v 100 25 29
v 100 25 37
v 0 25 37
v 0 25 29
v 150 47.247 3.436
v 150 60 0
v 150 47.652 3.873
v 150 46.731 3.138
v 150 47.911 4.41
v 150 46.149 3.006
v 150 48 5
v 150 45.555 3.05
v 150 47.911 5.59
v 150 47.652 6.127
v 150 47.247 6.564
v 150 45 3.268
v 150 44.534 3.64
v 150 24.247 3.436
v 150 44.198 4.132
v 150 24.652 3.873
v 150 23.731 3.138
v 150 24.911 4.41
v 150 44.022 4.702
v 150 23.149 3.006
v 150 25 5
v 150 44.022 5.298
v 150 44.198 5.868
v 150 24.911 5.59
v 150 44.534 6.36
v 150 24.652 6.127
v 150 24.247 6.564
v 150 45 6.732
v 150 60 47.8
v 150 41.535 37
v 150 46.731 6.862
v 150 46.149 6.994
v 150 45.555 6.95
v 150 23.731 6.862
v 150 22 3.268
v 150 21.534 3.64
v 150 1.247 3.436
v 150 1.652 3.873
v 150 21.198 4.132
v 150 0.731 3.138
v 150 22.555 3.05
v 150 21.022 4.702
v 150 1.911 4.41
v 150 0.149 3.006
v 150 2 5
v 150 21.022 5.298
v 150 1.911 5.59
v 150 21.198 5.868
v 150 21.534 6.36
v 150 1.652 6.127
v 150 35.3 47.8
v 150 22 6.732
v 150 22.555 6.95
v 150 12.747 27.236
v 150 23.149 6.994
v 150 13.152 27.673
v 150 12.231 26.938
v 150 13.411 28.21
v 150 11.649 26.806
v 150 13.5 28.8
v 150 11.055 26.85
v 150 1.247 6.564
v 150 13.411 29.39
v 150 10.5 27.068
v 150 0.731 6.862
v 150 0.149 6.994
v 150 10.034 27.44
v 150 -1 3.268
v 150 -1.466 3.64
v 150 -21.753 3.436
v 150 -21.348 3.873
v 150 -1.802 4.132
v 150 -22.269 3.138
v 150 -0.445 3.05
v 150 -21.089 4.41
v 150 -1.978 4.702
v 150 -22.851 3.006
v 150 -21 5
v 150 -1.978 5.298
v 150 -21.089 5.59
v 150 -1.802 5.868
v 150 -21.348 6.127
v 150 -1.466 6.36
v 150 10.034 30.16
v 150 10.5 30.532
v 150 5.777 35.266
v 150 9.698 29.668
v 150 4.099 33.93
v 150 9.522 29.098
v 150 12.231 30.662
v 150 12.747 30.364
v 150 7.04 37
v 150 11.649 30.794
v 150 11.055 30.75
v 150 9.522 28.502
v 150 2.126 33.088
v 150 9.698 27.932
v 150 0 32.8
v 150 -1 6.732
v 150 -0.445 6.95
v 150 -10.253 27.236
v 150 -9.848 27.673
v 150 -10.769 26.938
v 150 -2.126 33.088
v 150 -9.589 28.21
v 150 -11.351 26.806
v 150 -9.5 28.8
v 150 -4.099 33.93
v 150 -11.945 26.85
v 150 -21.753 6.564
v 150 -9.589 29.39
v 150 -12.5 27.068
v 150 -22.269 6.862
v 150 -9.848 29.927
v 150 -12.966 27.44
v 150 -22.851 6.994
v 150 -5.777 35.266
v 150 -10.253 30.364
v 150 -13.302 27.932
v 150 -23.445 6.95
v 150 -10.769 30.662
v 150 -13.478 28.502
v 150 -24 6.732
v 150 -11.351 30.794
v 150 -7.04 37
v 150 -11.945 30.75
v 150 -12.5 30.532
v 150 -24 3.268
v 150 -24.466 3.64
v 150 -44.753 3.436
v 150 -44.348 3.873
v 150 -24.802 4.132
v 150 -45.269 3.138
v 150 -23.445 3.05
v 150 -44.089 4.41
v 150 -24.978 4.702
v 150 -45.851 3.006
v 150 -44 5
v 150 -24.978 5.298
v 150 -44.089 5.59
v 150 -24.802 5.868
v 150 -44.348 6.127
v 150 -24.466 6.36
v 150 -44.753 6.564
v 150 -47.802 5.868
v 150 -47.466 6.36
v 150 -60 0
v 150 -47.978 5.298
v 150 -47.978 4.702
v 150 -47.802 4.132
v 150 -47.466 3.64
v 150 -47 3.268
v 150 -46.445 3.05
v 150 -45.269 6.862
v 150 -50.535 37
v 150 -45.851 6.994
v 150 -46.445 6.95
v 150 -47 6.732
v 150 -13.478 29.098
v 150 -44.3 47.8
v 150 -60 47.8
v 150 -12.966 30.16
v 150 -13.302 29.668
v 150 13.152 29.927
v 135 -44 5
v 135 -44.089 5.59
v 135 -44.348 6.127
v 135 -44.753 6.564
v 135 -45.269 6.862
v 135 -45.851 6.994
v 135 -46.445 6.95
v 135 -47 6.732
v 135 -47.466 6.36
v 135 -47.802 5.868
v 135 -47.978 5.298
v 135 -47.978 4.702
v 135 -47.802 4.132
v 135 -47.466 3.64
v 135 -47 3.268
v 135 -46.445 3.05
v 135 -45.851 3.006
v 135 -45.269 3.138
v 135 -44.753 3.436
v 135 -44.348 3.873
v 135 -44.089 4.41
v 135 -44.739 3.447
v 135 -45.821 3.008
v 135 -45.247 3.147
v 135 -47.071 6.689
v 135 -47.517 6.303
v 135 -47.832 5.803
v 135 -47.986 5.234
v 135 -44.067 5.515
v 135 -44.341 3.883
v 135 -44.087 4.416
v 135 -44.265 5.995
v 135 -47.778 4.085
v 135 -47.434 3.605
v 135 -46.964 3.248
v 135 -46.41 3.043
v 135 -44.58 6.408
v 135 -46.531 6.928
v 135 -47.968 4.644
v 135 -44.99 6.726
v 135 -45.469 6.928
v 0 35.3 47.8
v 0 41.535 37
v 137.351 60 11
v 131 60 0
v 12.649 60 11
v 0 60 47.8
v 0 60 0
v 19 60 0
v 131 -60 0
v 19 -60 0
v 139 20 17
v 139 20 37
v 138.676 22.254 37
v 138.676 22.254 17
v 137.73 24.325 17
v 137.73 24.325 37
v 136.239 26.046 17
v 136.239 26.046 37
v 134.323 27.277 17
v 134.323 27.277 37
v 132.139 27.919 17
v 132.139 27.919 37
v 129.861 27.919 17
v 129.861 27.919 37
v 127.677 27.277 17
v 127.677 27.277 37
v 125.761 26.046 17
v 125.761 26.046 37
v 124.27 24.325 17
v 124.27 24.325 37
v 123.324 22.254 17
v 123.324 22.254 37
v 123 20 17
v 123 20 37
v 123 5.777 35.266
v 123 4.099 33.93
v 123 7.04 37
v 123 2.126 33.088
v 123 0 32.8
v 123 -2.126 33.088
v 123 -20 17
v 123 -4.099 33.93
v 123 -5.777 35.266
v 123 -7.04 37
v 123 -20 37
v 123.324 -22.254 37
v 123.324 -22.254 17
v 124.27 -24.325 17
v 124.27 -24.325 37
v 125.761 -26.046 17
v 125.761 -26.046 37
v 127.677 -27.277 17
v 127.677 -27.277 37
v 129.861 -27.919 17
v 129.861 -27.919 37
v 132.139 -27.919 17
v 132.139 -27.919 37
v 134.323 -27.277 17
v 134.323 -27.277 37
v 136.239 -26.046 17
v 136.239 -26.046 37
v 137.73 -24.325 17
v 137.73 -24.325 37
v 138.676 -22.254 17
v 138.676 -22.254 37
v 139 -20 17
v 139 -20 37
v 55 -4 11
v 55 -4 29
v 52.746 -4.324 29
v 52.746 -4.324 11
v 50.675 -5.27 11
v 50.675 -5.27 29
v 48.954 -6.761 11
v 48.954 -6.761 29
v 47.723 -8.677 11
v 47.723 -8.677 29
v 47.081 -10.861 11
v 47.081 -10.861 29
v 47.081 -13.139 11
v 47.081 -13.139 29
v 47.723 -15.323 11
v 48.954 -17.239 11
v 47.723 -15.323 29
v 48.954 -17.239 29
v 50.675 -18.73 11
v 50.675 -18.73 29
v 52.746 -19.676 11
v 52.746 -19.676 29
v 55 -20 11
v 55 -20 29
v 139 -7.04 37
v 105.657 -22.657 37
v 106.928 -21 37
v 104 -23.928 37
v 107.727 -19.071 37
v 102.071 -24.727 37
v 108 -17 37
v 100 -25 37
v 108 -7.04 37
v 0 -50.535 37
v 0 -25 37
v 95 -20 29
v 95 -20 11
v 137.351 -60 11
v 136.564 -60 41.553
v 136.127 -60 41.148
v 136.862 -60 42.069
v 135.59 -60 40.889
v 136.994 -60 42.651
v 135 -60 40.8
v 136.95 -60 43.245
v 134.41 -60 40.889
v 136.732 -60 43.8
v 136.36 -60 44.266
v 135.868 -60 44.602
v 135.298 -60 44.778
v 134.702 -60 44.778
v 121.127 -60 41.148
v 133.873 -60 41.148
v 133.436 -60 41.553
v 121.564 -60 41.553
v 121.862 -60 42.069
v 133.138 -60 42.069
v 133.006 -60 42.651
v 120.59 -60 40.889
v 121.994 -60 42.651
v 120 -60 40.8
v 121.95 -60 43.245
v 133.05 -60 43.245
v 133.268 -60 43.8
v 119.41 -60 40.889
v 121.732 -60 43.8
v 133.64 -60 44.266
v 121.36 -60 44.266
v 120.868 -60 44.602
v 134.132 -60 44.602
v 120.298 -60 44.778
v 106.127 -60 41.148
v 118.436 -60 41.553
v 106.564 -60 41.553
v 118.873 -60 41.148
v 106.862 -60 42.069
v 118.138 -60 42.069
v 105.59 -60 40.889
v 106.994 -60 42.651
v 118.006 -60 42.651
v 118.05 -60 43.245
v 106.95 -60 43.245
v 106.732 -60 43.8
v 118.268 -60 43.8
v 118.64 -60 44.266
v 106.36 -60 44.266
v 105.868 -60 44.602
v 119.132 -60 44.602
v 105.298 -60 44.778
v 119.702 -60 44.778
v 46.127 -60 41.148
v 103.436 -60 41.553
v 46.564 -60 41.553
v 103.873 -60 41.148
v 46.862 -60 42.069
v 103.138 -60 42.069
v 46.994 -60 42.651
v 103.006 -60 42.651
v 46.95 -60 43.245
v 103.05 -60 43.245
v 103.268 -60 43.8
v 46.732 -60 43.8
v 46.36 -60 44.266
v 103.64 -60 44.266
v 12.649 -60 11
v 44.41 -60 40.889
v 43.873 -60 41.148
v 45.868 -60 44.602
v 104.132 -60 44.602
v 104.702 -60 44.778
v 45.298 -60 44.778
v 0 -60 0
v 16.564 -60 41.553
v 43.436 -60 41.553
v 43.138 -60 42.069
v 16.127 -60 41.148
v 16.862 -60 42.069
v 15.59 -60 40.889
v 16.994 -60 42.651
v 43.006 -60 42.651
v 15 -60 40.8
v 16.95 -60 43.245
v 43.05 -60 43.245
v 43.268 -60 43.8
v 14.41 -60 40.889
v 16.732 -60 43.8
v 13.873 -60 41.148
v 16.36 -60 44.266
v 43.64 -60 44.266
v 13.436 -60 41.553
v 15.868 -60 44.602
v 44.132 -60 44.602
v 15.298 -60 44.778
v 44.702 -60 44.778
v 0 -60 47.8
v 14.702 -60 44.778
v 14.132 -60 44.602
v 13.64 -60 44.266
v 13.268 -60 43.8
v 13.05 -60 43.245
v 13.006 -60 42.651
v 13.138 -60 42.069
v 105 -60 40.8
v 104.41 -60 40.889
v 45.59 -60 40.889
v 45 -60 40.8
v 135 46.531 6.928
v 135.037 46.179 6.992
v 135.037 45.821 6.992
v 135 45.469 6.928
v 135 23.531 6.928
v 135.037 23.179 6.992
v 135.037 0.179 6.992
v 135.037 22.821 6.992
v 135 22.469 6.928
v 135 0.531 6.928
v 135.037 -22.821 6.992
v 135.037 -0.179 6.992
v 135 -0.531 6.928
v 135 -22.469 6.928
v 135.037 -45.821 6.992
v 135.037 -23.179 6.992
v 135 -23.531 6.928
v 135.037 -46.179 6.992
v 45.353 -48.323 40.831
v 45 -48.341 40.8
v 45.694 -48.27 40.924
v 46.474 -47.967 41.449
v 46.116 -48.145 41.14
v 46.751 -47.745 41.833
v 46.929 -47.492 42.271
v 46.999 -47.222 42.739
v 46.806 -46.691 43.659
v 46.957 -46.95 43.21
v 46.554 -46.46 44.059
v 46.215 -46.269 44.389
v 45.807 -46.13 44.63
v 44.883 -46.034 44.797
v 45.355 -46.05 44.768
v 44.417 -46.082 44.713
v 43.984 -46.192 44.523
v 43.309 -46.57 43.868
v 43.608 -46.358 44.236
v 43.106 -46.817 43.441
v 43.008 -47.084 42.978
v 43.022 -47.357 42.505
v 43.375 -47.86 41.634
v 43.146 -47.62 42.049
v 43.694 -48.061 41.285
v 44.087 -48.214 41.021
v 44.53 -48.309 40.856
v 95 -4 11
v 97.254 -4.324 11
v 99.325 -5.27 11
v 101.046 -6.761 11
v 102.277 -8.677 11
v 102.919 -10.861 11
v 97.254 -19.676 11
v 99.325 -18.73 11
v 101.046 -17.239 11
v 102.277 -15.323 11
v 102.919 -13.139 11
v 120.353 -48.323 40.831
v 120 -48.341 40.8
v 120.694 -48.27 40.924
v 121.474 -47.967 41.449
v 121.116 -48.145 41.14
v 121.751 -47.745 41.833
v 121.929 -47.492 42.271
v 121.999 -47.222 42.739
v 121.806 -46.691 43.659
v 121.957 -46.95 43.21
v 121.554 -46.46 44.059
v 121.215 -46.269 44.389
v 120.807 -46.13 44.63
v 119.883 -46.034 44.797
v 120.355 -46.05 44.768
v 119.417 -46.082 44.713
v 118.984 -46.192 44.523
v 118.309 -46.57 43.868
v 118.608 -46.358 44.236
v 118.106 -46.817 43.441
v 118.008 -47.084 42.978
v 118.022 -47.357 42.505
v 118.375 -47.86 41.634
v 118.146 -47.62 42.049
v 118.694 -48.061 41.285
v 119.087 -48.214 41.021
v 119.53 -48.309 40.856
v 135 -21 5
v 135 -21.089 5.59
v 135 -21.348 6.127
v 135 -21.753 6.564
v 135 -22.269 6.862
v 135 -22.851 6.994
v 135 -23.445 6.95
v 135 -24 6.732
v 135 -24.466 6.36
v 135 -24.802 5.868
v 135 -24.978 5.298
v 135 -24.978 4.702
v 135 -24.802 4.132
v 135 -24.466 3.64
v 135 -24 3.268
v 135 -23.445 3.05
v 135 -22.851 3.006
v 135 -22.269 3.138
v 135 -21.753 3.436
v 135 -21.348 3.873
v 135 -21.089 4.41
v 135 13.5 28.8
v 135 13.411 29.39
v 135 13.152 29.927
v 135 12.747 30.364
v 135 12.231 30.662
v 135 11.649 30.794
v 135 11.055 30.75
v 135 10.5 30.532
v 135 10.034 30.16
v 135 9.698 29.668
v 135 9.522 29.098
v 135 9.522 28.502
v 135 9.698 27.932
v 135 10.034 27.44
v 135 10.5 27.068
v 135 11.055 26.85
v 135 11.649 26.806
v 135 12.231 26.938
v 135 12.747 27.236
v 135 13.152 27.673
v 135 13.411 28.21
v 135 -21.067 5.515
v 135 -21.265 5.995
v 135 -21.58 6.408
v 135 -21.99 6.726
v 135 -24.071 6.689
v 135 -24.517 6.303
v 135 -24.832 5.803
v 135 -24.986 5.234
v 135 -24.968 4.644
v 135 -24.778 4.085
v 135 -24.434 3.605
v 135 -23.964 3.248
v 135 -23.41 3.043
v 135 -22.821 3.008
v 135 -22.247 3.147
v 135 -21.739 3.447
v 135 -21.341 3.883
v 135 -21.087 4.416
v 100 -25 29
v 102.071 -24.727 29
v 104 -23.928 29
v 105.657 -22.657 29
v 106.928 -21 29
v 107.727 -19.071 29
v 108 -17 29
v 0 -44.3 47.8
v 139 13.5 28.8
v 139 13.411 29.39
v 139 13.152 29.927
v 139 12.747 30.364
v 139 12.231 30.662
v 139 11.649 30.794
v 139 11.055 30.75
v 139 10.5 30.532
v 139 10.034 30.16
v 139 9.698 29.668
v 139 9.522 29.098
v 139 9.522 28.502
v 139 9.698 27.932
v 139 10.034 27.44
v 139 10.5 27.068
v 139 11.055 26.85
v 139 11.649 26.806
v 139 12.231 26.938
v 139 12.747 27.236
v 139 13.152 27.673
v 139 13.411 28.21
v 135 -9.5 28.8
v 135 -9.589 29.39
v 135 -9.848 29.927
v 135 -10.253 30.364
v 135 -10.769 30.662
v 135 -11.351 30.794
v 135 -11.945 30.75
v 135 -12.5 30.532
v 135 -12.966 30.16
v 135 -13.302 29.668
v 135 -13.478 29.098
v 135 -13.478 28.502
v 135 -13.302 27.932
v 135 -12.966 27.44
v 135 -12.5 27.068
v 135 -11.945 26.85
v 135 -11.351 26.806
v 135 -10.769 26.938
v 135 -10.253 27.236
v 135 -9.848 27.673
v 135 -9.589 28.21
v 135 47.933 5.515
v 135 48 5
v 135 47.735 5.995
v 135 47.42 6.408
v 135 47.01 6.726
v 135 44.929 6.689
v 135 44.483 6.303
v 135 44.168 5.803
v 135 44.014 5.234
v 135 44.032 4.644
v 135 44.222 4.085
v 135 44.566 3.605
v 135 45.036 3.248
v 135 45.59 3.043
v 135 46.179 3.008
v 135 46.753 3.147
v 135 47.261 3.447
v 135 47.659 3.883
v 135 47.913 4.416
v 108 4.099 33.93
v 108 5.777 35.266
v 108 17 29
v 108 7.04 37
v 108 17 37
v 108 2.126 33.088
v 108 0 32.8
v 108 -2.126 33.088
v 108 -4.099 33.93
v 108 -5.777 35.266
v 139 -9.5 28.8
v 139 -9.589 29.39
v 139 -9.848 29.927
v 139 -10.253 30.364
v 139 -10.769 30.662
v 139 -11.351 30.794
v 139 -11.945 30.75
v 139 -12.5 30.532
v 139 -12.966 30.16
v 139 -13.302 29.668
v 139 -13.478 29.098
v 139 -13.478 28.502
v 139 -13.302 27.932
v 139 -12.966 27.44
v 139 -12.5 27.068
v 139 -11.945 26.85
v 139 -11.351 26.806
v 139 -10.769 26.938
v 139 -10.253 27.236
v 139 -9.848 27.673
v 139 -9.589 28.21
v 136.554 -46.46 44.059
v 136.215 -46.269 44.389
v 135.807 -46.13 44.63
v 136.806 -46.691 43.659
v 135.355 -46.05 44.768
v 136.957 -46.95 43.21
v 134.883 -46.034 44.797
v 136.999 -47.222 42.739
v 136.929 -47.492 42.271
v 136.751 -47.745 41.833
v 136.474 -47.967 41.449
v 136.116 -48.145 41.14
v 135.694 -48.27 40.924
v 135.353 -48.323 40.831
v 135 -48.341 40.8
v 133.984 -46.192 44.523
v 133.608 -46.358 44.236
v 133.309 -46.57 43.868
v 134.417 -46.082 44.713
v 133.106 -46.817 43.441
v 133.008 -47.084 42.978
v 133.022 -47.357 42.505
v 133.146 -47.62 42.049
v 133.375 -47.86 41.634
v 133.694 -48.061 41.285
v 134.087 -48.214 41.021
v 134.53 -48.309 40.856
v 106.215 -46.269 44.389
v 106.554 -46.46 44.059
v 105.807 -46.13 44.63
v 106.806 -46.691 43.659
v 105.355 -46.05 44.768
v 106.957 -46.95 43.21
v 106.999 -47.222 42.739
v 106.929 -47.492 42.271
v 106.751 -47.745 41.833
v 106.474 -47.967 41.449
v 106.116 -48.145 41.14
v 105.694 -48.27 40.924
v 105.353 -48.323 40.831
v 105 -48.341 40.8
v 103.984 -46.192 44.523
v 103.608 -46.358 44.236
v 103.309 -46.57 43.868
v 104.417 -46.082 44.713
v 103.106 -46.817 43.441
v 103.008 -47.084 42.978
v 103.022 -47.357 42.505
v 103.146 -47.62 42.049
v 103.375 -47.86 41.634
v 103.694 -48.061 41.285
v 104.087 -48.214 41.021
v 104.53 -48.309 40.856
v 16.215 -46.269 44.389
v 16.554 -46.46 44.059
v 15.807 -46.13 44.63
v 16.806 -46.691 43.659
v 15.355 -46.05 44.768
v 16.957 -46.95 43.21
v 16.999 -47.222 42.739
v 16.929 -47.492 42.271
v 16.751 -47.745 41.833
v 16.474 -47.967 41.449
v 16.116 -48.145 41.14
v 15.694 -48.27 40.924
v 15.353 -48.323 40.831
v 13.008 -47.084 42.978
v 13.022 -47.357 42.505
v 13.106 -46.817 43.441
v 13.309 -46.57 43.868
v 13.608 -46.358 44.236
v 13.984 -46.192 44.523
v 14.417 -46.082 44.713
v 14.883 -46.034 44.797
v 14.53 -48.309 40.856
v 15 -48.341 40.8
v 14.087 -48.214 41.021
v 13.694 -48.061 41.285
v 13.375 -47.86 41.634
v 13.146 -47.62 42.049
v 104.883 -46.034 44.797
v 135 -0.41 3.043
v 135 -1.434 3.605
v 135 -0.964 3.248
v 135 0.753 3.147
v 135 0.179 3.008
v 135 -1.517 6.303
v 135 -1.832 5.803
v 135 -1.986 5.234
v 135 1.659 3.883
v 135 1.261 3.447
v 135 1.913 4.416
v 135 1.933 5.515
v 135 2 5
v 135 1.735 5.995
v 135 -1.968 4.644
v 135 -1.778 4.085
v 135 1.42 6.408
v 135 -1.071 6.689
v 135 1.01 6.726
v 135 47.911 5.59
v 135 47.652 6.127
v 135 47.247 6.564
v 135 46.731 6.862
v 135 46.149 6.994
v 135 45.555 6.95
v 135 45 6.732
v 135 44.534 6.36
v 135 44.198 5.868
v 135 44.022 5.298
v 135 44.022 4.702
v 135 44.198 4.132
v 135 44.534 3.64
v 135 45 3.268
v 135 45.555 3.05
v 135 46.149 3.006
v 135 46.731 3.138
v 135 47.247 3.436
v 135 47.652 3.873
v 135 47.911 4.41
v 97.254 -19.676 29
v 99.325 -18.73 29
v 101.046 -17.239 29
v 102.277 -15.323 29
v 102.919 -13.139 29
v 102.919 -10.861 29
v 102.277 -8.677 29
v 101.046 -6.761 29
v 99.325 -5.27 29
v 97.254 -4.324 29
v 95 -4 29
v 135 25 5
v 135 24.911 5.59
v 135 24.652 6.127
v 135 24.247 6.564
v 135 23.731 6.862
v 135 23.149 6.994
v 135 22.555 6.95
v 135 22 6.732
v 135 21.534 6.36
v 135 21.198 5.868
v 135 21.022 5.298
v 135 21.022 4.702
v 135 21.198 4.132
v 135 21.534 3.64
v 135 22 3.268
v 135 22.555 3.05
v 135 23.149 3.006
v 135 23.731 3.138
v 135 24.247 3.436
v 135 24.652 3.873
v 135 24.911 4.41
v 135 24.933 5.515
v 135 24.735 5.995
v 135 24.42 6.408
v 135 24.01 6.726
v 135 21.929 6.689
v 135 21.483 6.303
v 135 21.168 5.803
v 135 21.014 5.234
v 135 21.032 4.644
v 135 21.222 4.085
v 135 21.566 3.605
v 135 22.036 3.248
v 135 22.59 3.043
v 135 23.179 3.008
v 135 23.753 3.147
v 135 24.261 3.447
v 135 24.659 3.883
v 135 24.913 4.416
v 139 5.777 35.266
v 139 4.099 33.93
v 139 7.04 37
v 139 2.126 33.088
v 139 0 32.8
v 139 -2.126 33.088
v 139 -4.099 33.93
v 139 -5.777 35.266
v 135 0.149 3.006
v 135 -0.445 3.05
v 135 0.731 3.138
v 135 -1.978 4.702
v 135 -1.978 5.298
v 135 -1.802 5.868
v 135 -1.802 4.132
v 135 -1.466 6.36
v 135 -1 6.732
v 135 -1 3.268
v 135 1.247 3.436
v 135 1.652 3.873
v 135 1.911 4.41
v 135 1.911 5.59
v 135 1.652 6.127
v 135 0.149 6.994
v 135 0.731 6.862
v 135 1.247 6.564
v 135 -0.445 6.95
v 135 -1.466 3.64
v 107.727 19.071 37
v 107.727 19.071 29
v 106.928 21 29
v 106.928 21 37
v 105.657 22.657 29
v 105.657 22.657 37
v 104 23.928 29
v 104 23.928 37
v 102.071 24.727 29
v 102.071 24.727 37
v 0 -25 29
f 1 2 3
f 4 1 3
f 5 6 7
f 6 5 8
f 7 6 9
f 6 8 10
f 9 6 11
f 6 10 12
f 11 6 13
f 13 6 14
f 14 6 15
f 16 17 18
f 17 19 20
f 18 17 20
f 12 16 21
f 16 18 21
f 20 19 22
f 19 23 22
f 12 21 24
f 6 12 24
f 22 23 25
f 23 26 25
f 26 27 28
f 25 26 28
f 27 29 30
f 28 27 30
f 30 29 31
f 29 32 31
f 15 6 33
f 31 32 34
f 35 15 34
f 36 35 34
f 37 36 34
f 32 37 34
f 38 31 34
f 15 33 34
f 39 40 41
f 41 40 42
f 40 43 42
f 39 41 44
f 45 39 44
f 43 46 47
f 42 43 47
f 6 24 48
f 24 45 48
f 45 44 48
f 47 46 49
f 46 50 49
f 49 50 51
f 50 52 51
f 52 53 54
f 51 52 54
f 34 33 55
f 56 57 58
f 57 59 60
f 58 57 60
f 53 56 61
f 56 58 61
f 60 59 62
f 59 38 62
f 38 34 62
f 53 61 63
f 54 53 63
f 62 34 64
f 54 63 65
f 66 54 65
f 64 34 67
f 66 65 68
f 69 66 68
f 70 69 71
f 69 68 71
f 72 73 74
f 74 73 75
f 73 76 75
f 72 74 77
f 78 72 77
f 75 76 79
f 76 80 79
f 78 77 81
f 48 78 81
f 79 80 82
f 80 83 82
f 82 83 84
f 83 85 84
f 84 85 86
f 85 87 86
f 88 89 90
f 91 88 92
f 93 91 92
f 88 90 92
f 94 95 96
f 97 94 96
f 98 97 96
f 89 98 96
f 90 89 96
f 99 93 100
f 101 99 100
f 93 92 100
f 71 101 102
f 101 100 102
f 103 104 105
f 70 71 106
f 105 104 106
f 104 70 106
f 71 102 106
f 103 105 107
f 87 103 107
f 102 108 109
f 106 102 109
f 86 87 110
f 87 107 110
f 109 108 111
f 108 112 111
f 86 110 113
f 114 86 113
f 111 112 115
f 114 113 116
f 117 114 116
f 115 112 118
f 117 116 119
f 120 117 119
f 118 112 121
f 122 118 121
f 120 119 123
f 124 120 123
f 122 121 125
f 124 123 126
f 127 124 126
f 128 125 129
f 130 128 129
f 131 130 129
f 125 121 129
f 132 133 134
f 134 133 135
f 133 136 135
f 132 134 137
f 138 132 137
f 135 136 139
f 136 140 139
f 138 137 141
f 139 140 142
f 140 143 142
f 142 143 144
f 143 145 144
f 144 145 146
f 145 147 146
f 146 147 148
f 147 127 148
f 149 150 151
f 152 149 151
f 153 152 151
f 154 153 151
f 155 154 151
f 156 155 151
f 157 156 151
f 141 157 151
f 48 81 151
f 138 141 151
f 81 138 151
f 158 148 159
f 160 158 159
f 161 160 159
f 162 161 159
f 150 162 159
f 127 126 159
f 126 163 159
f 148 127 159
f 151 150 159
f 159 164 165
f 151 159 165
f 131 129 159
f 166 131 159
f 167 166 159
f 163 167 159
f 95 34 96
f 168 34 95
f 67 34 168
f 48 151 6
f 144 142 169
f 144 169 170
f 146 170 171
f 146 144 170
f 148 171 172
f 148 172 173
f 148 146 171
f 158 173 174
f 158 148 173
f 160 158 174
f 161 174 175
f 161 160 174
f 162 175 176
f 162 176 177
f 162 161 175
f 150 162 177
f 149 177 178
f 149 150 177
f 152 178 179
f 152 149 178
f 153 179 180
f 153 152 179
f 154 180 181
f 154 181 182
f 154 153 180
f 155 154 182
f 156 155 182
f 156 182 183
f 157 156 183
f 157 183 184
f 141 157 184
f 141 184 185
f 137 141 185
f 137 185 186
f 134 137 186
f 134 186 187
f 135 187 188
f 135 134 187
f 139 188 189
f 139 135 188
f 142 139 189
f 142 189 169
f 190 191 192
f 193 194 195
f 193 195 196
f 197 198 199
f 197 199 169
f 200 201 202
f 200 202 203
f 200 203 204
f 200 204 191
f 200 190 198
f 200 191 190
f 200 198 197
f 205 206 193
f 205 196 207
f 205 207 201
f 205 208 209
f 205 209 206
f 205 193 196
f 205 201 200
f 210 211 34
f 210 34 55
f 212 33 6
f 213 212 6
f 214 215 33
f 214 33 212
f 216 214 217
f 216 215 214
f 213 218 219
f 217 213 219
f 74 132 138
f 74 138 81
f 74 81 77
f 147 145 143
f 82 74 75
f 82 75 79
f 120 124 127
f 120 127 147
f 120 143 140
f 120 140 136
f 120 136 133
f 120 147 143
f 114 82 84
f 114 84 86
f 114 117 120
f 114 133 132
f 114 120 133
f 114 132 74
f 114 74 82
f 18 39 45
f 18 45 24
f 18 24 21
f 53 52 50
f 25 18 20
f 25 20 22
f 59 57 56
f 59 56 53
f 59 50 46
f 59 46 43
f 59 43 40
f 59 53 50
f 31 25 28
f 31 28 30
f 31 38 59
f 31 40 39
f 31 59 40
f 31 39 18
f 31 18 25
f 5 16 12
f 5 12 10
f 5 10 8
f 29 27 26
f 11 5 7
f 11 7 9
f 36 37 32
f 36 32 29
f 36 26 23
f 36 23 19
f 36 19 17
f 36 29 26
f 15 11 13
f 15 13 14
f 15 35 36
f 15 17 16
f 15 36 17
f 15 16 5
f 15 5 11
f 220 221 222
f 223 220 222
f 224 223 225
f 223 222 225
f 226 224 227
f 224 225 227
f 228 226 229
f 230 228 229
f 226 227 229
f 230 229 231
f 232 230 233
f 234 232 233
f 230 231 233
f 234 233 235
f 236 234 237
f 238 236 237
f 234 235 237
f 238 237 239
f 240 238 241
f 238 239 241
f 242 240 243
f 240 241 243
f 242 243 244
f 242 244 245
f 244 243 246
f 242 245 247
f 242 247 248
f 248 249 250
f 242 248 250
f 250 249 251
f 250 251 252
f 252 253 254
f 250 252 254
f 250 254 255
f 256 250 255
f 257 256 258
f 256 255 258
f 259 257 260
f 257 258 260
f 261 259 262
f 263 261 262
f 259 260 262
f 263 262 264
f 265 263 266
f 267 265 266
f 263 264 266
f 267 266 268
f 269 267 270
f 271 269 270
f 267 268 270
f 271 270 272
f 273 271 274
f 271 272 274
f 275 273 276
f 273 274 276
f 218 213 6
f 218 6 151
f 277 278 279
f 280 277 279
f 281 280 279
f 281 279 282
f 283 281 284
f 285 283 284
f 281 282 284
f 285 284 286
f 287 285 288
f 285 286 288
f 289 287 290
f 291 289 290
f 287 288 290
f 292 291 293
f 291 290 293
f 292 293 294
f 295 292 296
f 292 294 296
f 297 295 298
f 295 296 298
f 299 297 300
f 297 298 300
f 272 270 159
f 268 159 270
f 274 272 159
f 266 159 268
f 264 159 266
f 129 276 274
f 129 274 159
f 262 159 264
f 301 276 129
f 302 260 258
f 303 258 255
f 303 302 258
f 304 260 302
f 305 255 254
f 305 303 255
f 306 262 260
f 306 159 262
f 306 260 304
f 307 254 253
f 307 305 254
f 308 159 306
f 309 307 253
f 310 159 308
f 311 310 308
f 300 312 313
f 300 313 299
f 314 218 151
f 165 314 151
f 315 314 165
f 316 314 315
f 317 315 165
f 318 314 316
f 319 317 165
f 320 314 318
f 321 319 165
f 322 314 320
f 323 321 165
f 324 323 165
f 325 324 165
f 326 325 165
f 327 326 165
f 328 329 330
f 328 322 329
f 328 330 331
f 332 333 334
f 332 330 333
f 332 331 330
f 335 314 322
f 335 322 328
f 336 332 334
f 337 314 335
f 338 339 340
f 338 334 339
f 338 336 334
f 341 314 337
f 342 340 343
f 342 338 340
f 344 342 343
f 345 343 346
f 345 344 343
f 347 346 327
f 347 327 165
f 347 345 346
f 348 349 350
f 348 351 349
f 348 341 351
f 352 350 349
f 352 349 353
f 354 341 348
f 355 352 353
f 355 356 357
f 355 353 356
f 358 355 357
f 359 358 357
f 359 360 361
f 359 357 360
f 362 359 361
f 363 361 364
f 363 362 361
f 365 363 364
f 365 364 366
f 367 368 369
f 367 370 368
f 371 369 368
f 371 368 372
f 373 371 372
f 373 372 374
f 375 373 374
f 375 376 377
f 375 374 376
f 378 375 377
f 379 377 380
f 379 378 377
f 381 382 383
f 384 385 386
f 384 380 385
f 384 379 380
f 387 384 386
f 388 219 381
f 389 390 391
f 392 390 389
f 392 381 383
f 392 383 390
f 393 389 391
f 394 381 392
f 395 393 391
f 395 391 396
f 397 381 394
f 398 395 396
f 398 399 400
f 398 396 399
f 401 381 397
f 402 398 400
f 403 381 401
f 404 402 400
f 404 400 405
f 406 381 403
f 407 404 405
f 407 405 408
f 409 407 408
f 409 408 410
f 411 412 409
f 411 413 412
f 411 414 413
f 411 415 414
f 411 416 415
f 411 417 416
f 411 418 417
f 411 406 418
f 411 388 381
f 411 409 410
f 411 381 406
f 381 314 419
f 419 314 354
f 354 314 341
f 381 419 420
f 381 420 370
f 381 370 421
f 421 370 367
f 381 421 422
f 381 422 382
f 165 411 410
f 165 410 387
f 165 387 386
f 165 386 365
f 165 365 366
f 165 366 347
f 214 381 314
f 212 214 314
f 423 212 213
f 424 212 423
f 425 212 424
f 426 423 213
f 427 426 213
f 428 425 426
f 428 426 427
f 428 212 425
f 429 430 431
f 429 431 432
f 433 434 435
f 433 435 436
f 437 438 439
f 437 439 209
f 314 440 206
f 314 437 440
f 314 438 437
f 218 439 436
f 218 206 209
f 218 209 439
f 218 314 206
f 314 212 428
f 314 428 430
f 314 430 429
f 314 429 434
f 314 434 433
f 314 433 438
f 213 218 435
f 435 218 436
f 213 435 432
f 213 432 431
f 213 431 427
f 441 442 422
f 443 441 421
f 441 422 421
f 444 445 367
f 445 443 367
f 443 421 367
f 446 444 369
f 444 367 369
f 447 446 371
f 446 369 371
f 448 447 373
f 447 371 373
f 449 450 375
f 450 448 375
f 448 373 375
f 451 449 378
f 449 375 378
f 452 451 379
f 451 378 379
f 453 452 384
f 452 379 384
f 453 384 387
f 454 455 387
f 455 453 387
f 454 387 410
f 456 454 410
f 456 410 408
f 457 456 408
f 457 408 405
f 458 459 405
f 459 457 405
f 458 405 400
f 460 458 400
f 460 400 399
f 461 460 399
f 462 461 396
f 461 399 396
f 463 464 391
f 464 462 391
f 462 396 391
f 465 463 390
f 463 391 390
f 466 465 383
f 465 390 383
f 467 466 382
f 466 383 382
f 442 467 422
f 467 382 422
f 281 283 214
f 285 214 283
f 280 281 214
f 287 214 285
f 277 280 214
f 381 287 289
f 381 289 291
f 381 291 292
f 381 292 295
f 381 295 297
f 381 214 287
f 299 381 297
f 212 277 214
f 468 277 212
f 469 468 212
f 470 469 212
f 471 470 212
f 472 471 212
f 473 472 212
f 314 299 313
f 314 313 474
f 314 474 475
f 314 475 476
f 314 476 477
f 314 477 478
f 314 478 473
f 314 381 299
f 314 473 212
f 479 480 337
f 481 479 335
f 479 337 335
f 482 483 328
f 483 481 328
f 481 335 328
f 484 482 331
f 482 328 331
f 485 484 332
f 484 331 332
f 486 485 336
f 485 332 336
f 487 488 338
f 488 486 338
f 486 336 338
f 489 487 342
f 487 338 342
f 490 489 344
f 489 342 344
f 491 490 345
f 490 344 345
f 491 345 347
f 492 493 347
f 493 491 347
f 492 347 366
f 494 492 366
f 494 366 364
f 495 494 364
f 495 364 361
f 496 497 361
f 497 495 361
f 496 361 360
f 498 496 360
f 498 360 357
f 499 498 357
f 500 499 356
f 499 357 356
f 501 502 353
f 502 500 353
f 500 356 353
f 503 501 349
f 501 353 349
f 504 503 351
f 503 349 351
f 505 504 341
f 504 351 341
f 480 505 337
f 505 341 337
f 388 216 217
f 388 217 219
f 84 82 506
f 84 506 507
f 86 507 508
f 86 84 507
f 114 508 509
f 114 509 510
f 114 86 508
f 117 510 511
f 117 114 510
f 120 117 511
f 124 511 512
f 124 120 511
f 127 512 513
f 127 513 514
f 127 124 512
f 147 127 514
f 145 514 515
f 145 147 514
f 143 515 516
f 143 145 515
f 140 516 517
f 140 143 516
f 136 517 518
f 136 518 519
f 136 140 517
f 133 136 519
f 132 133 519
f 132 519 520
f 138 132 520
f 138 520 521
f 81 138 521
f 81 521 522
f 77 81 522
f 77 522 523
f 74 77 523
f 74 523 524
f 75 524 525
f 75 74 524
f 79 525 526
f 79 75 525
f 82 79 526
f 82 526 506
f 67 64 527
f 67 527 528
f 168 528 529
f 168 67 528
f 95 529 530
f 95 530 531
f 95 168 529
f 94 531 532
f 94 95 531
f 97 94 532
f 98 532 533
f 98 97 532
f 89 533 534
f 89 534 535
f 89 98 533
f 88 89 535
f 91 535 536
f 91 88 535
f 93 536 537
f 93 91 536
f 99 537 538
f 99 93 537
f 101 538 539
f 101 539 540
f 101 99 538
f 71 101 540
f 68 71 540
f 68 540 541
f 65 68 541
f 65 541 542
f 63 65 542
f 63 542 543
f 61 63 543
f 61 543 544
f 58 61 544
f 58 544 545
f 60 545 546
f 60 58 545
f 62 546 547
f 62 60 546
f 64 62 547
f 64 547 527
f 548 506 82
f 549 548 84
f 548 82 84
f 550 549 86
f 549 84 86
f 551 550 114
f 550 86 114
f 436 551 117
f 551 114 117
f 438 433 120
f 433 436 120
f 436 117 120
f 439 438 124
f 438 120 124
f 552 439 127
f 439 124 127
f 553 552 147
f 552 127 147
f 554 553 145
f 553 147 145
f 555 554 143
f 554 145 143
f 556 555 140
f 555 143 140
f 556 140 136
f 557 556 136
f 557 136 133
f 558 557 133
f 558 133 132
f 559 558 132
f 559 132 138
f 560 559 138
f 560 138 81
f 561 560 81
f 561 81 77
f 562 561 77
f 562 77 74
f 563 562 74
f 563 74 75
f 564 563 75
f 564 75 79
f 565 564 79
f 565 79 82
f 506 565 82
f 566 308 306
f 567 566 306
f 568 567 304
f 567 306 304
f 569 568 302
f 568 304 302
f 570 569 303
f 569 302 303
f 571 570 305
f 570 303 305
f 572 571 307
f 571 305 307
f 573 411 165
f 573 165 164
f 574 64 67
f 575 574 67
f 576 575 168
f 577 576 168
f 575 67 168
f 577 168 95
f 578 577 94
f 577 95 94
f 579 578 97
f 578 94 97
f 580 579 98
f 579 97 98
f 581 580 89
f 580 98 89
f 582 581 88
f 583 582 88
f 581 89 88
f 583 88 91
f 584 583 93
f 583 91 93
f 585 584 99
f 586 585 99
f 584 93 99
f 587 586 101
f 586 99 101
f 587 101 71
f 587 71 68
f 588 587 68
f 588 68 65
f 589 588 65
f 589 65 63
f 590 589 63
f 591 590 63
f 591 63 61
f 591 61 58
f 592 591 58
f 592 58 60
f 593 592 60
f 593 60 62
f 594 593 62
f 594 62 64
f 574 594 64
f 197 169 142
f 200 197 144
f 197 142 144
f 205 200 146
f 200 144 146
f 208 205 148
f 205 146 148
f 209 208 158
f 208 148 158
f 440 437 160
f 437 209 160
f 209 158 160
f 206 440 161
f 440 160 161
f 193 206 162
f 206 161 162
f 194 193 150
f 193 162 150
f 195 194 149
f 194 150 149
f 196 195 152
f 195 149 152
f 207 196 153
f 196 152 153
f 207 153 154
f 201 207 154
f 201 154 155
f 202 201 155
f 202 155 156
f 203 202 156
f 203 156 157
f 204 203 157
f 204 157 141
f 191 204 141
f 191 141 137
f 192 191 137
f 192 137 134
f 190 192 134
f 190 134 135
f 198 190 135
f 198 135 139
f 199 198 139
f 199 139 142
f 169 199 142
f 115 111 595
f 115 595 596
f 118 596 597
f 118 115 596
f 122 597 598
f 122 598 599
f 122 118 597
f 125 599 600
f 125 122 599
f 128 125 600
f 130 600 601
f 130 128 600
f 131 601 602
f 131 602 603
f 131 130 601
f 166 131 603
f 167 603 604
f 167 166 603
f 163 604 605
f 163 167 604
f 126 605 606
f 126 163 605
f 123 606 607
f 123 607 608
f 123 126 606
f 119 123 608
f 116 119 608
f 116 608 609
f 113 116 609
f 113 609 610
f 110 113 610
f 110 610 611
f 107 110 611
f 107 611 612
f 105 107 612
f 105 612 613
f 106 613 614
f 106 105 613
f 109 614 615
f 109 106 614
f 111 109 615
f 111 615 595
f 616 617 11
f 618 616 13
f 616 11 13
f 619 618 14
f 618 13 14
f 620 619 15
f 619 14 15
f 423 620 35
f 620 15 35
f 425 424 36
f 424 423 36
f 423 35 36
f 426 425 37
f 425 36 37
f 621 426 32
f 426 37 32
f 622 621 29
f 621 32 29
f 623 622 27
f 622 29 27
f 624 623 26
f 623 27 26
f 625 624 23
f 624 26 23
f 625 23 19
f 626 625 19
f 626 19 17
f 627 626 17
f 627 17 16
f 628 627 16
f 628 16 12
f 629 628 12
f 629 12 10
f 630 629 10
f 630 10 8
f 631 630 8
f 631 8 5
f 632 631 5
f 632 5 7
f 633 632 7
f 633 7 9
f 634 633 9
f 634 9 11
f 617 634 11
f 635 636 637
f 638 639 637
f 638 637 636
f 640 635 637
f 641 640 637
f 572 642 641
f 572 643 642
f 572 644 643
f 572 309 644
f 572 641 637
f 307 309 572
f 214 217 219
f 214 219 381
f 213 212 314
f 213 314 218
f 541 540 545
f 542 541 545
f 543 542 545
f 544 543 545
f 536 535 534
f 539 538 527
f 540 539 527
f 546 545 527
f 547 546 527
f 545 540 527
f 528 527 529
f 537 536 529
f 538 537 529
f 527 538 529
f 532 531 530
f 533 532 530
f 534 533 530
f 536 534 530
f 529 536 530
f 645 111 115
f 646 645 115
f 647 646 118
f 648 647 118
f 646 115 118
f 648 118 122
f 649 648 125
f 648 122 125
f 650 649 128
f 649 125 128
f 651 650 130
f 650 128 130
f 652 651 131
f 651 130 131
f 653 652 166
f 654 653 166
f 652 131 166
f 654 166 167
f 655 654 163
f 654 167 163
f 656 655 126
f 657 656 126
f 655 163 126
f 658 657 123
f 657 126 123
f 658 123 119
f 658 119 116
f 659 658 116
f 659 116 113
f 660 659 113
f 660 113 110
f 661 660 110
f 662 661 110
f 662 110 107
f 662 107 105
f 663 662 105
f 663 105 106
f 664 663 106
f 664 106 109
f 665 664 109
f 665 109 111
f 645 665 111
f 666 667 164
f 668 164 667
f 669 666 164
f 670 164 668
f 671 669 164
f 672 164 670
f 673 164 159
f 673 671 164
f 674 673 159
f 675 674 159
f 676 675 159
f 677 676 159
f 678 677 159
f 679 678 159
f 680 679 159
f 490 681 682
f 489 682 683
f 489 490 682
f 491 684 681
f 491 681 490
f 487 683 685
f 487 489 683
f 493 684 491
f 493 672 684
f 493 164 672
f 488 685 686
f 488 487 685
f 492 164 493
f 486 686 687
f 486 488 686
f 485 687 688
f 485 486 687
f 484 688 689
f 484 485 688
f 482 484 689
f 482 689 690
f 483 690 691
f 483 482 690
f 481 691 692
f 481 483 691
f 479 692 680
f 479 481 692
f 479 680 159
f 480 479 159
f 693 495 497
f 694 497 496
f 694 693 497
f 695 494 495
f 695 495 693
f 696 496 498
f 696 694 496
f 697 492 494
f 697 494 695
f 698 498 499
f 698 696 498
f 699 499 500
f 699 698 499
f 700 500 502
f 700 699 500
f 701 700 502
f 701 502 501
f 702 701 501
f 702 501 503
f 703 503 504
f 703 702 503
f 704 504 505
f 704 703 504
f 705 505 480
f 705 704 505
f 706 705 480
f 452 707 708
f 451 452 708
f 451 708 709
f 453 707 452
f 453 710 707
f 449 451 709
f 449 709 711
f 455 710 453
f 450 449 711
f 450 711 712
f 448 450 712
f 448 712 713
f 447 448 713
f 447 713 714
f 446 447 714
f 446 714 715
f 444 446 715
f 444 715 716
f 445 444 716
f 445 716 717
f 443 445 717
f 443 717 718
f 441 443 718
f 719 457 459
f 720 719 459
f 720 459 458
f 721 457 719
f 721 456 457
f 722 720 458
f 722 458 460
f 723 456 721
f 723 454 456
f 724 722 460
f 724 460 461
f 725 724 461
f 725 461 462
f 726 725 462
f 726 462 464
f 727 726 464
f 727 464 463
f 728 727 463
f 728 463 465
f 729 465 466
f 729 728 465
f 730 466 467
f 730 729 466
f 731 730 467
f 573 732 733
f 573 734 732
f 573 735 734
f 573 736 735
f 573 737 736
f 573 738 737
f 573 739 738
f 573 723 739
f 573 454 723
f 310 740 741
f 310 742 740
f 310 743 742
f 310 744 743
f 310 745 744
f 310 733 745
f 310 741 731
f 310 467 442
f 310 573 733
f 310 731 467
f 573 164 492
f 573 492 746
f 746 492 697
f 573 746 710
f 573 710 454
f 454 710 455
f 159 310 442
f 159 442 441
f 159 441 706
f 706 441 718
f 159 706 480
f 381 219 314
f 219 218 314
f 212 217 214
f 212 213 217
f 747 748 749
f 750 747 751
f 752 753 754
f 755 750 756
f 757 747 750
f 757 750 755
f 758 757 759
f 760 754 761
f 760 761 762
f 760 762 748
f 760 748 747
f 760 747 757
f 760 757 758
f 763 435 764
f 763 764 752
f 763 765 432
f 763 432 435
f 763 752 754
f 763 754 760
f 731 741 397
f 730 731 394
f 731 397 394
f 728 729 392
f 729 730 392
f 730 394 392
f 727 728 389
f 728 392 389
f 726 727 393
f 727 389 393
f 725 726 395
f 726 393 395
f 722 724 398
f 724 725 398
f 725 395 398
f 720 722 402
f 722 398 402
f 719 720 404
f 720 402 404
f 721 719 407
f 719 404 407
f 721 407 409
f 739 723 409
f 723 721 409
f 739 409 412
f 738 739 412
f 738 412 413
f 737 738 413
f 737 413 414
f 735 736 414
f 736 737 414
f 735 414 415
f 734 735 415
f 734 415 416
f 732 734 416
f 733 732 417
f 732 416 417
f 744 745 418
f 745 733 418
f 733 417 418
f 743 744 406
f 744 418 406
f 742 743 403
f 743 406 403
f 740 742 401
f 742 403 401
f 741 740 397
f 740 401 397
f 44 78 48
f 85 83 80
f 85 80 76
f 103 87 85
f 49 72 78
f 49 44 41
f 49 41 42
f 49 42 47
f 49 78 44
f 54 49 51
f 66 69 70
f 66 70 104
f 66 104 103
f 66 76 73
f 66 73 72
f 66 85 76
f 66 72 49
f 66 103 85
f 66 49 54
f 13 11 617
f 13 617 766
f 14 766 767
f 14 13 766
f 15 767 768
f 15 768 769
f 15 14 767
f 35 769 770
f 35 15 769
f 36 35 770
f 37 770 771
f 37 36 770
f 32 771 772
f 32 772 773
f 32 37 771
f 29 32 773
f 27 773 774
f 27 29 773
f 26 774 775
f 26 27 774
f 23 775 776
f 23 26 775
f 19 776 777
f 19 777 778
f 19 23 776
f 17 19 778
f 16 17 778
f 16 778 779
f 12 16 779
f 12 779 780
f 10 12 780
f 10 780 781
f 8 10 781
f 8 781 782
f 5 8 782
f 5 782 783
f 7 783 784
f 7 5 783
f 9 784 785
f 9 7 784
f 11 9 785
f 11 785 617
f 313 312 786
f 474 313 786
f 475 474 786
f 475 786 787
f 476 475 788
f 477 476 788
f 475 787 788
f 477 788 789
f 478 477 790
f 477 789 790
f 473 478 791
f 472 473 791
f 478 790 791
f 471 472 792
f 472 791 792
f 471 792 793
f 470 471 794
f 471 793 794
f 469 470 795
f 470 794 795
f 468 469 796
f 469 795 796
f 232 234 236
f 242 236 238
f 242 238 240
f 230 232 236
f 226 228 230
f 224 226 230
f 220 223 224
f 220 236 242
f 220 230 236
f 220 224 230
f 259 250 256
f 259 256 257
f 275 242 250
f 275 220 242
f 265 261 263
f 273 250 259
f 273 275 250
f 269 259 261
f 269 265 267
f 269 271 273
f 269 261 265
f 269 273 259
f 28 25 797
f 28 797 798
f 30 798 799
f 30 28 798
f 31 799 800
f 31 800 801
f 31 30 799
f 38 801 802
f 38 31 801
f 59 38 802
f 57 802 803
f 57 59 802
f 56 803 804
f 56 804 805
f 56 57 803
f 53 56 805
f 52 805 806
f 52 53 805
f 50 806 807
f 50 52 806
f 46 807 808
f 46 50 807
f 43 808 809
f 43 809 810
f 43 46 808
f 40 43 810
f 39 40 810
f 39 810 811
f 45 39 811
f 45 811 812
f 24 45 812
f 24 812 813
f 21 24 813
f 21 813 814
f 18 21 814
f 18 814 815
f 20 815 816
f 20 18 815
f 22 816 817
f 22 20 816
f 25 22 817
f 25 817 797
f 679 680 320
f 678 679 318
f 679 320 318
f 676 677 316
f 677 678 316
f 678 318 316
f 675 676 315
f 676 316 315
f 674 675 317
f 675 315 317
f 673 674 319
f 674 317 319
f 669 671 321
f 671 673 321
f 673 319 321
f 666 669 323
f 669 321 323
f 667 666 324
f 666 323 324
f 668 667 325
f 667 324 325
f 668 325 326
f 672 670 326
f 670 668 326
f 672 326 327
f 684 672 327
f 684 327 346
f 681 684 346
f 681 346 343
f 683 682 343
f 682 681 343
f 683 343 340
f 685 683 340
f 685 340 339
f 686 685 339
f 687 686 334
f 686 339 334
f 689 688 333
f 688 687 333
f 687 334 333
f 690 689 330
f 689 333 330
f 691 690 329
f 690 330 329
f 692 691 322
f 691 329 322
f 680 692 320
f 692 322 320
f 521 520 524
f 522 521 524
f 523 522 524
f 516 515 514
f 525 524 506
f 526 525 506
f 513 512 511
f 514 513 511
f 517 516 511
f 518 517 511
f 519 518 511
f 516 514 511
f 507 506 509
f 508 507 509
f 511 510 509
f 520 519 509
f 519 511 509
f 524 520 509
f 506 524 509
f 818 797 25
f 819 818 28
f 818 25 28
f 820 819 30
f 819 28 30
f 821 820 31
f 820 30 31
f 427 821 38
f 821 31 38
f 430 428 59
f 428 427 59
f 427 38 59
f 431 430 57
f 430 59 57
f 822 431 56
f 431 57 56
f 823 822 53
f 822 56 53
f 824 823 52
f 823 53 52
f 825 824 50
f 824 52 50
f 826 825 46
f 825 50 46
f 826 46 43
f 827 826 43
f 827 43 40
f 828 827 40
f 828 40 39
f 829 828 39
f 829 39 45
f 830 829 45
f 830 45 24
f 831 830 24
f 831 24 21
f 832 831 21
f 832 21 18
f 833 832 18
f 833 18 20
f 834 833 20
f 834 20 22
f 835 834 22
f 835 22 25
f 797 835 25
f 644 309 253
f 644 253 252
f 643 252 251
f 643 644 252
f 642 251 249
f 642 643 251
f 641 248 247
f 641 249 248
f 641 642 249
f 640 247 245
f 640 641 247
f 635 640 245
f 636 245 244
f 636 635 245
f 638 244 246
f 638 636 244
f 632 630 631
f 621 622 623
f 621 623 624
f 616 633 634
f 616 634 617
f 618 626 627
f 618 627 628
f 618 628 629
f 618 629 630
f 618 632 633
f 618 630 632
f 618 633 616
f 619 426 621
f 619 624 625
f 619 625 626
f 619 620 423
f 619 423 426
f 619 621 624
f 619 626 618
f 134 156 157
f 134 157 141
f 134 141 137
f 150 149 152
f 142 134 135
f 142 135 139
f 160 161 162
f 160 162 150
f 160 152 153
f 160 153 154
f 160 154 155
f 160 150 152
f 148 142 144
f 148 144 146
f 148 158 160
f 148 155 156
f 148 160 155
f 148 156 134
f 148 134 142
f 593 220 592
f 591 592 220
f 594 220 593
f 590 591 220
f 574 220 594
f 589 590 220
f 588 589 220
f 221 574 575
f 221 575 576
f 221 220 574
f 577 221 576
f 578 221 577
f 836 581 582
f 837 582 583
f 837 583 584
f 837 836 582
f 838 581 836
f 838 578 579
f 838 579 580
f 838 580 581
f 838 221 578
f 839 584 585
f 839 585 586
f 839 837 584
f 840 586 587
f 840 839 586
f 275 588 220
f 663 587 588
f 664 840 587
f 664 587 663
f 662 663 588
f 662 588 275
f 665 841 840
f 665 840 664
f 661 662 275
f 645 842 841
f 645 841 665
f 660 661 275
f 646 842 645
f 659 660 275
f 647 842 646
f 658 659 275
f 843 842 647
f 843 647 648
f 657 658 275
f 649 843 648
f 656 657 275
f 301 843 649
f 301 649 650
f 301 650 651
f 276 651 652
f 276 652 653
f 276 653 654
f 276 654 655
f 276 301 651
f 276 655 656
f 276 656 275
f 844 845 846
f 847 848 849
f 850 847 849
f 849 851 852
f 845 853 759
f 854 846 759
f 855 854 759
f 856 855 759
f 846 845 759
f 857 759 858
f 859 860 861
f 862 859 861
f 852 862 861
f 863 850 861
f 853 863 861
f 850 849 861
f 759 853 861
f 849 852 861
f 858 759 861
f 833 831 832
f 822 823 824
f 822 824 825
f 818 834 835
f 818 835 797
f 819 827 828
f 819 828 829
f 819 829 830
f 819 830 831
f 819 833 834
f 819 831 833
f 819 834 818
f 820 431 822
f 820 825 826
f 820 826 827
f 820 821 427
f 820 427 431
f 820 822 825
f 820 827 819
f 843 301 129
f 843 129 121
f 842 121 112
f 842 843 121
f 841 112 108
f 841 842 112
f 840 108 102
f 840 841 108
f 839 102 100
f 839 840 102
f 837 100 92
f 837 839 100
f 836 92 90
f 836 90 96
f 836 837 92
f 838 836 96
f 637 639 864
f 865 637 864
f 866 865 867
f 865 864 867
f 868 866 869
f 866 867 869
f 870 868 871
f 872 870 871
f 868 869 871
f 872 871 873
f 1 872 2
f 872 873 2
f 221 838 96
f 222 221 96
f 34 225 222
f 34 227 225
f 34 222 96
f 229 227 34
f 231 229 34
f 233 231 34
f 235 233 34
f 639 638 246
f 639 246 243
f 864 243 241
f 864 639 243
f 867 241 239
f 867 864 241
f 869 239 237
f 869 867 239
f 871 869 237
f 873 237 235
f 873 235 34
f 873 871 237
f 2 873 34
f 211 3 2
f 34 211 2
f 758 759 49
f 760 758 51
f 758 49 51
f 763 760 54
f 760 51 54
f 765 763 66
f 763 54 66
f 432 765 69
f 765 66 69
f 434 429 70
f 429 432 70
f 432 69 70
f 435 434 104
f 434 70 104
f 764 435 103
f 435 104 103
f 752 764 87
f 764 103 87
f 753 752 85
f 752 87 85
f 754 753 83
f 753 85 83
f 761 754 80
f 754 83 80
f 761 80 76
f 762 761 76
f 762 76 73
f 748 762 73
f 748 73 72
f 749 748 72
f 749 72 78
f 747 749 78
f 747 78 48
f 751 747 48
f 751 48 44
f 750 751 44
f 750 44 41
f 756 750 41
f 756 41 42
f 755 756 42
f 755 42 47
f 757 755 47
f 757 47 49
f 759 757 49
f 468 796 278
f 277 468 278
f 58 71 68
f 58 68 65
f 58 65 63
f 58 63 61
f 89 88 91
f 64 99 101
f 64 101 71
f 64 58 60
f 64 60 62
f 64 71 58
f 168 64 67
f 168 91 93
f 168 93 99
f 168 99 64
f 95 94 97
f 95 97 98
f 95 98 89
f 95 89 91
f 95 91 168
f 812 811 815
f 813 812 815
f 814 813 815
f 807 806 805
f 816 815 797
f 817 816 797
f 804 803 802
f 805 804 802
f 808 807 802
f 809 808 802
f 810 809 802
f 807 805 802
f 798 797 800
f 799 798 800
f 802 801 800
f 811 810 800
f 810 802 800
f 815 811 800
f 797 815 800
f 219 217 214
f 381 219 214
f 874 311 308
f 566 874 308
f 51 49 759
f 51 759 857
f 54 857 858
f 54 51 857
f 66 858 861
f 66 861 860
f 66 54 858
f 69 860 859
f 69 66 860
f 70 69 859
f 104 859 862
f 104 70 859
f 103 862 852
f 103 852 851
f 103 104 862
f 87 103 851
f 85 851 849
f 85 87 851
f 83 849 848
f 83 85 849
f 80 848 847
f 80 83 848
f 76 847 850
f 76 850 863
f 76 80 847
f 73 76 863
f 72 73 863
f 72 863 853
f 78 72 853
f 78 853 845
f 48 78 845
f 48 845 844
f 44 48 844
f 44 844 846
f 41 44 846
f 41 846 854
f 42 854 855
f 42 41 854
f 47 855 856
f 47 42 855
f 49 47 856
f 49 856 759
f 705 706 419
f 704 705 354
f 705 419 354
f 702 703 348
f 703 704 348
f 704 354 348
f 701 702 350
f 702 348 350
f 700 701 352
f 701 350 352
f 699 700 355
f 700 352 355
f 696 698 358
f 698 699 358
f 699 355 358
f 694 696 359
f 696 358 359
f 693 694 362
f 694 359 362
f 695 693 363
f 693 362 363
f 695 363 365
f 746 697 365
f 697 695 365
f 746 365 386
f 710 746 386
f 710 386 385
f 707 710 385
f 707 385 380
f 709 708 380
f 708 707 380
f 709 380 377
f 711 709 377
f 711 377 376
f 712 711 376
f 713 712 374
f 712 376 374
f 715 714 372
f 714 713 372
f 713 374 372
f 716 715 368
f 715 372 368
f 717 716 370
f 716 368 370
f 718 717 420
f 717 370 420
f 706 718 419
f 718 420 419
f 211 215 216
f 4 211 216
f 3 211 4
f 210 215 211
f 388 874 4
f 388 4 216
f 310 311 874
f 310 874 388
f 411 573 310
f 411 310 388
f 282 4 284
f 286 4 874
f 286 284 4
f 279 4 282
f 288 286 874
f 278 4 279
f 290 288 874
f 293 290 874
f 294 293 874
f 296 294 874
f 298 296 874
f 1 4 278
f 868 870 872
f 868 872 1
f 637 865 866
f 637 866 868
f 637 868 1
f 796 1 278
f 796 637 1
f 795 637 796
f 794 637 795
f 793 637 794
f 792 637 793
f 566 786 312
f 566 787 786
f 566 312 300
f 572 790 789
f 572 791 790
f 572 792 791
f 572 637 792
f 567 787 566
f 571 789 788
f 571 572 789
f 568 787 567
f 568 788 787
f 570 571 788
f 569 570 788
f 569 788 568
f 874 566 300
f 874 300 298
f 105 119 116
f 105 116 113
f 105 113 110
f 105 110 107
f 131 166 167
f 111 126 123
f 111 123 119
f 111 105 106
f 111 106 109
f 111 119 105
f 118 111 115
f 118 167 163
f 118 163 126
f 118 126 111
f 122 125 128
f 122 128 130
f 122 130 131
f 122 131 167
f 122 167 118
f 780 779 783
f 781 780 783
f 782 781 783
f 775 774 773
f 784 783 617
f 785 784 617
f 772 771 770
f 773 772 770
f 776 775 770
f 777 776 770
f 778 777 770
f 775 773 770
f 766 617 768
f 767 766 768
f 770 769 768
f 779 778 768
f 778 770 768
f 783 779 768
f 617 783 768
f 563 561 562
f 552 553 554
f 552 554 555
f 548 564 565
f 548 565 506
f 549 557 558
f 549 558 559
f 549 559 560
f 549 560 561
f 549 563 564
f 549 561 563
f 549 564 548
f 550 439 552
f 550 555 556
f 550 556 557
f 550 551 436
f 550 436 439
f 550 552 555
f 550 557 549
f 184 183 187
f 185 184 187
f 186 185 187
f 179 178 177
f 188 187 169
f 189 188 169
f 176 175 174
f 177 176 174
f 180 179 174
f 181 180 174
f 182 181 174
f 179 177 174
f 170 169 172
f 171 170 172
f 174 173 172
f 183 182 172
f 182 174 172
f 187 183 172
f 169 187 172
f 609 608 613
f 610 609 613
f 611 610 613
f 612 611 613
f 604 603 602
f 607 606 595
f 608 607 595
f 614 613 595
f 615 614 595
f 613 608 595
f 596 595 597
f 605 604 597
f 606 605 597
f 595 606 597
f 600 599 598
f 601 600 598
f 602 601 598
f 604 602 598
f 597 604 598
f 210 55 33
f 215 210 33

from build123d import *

# Parameters (mm, degrees)
EXTRUDE_SKETCH002001_DEPTH = 120
SKETCH001_R                = 2
EXTRUDE_SKETCH001001_DEPTH = 15
EXTRUDE_SKETCH001_DEPTH    = 15
EXTRUDE_SKETCH002_DEPTH    = 120
PAD_DEPTH                  = 150
POCKET003_DEPTH            = 20
POCKET004_DEPTH            = 8
POCKET005_DEPTH            = 30.8
SKETCH003_R                = 2
POCKET_DEPTH               = 19


with BuildPart() as sketch_006_extrude001:
    # Sketch002 → Extrude_Sketch002001 (new body)
    with BuildSketch(Plane(origin=(0, -60, 0), x_dir=(0, 0, -1), z_dir=(0, -1, 0))):
        Polygon((0, 19), (-11, 12.649147), (-11, 137.350853), (0, 131), align=None)
    extrude(amount=-EXTRUDE_SKETCH002001_DEPTH)


with BuildPart() as sketch_005_extrude001:
    # Sketch001 → Extrude_Sketch001001 (new body)
    with BuildSketch(Plane.YZ.offset(150)):
        with Locations((0, 5)):
            Circle(SKETCH001_R)
        with Locations((23, 5)):
            Circle(SKETCH001_R)
        with Locations((46, 5)):
            Circle(SKETCH001_R)
        with Locations((-23, 5)):
            Circle(SKETCH001_R)
        with Locations((-46, 5)):
            Circle(SKETCH001_R)
        with Locations((-11.5, 28.8)):
            Circle(SKETCH001_R)
        with Locations((11.5, 28.8)):
            Circle(SKETCH001_R)
    extrude(amount=-EXTRUDE_SKETCH001001_DEPTH)


with BuildPart() as sketch_005_extrude:
    # Sketch001 → Extrude_Sketch001 (new body)
    with BuildSketch(Plane.YZ.offset(150)):
        with Locations((0, 5)):
            Circle(SKETCH001_R)
        with Locations((23, 5)):
            Circle(SKETCH001_R)
        with Locations((46, 5)):
            Circle(SKETCH001_R)
        with Locations((-23, 5)):
            Circle(SKETCH001_R)
        with Locations((-46, 5)):
            Circle(SKETCH001_R)
        with Locations((-11.5, 28.8)):
            Circle(SKETCH001_R)
        with Locations((11.5, 28.8)):
            Circle(SKETCH001_R)
    extrude(amount=-EXTRUDE_SKETCH001_DEPTH)


with BuildPart() as sketch_006_extrude:
    # Sketch002 → Extrude_Sketch002 (new body)
    with BuildSketch(Plane(origin=(0, -60, 0), x_dir=(0, 0, -1), z_dir=(0, -1, 0))):
        Polygon((0, 19), (-11, 12.649147), (-11, 137.350853), (0, 131), align=None)
    extrude(amount=-EXTRUDE_SKETCH002_DEPTH)


with BuildPart() as cut001:
    # Sketch → Pad (new body)
    with BuildSketch(Plane.YZ):
        with BuildLine():
            Line((-60, 0), (-60, 47.8))
            Line((-60, 47.8), (-44.3, 47.8))
            Line((-44.3, 47.8), (-50.535383, 37))
            Line((-50.535383, 37), (-7.039886, 37))
            ThreePointArc((-7.039886, 37), (0, 32.8), (7.039886, 37))
            Line((7.039886, 37), (41.535383, 37))
            Line((41.535383, 37), (35.3, 47.8))
            Line((35.3, 47.8), (60, 47.8))
            Line((60, 47.8), (60, 0))
            Line((60, 0), (-60, 0))
        make_face()
    extrude(amount=PAD_DEPTH)

    # Sketch004 → Pocket003 (cut)
    with BuildSketch(Plane(origin=(0, 0, 37), x_dir=(0, -1, 0), z_dir=(0, 0, 1))):
        with BuildLine():
            ThreePointArc((-20, 139), (-28, 131), (-20, 123))
            Line((-20, 123), (20, 123))
            ThreePointArc((20, 123), (28, 131), (20, 139))
            Line((-20, 139), (20, 139))
        make_face()
    extrude(amount=-POCKET003_DEPTH, mode=Mode.SUBTRACT)

    # Sketch005 → Pocket004 (cut)
    with BuildSketch(Plane(origin=(0, 0, 37), x_dir=(0, -1, 0), z_dir=(0, 0, 1))):
        with BuildLine():
            ThreePointArc((-16.999966, 108), (-22.656842, 105.656866), (-25, 100))
            Line((-25, 100), (-25, 0))
            Line((-25, 0), (25, 0))
            Line((25, 0), (25, 100))
            ThreePointArc((25, 100), (22.656866, 105.656842), (17.000034, 108))
            Line((-16.999966, 108), (17.000034, 108))
        make_face()
    extrude(amount=-POCKET004_DEPTH, mode=Mode.SUBTRACT)

    # Sketch006 → Pocket005 (cut)
    with BuildSketch(Plane(origin=(0, 0, 29), x_dir=(0, -1, 0), z_dir=(0, 0, 1))):
        with BuildLine():
            ThreePointArc((20, 95), (12, 103), (4, 95))
            Line((4, 95), (4, 55))
            ThreePointArc((4, 55), (12, 47), (20, 55))
            Line((20, 95), (20, 55))
        make_face()
    extrude(amount=-POCKET005_DEPTH, mode=Mode.SUBTRACT)

    # Sketch003 → Pocket (cut)
    with BuildSketch(Plane(origin=(0, -60, 0), x_dir=(0, 0, -1), z_dir=(0, -1, 0))):
        with Locations((-42.8, 15)):
            Circle(SKETCH003_R)
        with Locations((-42.8, 45)):
            Circle(SKETCH003_R)
        with Locations((-42.8, 105)):
            Circle(SKETCH003_R)
        with Locations((-42.8, 120)):
            Circle(SKETCH003_R)
        with Locations((-42.8, 135)):
            Circle(SKETCH003_R)
    extrude(amount=-POCKET_DEPTH, mode=Mode.SUBTRACT)

    # Cut: cut Sketch-006_Extrude
    add(sketch_006_extrude.part, mode=Mode.SUBTRACT)

    # Cut001: cut Sketch-005_Extrude
    add(sketch_005_extrude.part, mode=Mode.SUBTRACT)


solid = Compound([sketch_006_extrude001.part, sketch_005_extrude001.part, cut001.part])
